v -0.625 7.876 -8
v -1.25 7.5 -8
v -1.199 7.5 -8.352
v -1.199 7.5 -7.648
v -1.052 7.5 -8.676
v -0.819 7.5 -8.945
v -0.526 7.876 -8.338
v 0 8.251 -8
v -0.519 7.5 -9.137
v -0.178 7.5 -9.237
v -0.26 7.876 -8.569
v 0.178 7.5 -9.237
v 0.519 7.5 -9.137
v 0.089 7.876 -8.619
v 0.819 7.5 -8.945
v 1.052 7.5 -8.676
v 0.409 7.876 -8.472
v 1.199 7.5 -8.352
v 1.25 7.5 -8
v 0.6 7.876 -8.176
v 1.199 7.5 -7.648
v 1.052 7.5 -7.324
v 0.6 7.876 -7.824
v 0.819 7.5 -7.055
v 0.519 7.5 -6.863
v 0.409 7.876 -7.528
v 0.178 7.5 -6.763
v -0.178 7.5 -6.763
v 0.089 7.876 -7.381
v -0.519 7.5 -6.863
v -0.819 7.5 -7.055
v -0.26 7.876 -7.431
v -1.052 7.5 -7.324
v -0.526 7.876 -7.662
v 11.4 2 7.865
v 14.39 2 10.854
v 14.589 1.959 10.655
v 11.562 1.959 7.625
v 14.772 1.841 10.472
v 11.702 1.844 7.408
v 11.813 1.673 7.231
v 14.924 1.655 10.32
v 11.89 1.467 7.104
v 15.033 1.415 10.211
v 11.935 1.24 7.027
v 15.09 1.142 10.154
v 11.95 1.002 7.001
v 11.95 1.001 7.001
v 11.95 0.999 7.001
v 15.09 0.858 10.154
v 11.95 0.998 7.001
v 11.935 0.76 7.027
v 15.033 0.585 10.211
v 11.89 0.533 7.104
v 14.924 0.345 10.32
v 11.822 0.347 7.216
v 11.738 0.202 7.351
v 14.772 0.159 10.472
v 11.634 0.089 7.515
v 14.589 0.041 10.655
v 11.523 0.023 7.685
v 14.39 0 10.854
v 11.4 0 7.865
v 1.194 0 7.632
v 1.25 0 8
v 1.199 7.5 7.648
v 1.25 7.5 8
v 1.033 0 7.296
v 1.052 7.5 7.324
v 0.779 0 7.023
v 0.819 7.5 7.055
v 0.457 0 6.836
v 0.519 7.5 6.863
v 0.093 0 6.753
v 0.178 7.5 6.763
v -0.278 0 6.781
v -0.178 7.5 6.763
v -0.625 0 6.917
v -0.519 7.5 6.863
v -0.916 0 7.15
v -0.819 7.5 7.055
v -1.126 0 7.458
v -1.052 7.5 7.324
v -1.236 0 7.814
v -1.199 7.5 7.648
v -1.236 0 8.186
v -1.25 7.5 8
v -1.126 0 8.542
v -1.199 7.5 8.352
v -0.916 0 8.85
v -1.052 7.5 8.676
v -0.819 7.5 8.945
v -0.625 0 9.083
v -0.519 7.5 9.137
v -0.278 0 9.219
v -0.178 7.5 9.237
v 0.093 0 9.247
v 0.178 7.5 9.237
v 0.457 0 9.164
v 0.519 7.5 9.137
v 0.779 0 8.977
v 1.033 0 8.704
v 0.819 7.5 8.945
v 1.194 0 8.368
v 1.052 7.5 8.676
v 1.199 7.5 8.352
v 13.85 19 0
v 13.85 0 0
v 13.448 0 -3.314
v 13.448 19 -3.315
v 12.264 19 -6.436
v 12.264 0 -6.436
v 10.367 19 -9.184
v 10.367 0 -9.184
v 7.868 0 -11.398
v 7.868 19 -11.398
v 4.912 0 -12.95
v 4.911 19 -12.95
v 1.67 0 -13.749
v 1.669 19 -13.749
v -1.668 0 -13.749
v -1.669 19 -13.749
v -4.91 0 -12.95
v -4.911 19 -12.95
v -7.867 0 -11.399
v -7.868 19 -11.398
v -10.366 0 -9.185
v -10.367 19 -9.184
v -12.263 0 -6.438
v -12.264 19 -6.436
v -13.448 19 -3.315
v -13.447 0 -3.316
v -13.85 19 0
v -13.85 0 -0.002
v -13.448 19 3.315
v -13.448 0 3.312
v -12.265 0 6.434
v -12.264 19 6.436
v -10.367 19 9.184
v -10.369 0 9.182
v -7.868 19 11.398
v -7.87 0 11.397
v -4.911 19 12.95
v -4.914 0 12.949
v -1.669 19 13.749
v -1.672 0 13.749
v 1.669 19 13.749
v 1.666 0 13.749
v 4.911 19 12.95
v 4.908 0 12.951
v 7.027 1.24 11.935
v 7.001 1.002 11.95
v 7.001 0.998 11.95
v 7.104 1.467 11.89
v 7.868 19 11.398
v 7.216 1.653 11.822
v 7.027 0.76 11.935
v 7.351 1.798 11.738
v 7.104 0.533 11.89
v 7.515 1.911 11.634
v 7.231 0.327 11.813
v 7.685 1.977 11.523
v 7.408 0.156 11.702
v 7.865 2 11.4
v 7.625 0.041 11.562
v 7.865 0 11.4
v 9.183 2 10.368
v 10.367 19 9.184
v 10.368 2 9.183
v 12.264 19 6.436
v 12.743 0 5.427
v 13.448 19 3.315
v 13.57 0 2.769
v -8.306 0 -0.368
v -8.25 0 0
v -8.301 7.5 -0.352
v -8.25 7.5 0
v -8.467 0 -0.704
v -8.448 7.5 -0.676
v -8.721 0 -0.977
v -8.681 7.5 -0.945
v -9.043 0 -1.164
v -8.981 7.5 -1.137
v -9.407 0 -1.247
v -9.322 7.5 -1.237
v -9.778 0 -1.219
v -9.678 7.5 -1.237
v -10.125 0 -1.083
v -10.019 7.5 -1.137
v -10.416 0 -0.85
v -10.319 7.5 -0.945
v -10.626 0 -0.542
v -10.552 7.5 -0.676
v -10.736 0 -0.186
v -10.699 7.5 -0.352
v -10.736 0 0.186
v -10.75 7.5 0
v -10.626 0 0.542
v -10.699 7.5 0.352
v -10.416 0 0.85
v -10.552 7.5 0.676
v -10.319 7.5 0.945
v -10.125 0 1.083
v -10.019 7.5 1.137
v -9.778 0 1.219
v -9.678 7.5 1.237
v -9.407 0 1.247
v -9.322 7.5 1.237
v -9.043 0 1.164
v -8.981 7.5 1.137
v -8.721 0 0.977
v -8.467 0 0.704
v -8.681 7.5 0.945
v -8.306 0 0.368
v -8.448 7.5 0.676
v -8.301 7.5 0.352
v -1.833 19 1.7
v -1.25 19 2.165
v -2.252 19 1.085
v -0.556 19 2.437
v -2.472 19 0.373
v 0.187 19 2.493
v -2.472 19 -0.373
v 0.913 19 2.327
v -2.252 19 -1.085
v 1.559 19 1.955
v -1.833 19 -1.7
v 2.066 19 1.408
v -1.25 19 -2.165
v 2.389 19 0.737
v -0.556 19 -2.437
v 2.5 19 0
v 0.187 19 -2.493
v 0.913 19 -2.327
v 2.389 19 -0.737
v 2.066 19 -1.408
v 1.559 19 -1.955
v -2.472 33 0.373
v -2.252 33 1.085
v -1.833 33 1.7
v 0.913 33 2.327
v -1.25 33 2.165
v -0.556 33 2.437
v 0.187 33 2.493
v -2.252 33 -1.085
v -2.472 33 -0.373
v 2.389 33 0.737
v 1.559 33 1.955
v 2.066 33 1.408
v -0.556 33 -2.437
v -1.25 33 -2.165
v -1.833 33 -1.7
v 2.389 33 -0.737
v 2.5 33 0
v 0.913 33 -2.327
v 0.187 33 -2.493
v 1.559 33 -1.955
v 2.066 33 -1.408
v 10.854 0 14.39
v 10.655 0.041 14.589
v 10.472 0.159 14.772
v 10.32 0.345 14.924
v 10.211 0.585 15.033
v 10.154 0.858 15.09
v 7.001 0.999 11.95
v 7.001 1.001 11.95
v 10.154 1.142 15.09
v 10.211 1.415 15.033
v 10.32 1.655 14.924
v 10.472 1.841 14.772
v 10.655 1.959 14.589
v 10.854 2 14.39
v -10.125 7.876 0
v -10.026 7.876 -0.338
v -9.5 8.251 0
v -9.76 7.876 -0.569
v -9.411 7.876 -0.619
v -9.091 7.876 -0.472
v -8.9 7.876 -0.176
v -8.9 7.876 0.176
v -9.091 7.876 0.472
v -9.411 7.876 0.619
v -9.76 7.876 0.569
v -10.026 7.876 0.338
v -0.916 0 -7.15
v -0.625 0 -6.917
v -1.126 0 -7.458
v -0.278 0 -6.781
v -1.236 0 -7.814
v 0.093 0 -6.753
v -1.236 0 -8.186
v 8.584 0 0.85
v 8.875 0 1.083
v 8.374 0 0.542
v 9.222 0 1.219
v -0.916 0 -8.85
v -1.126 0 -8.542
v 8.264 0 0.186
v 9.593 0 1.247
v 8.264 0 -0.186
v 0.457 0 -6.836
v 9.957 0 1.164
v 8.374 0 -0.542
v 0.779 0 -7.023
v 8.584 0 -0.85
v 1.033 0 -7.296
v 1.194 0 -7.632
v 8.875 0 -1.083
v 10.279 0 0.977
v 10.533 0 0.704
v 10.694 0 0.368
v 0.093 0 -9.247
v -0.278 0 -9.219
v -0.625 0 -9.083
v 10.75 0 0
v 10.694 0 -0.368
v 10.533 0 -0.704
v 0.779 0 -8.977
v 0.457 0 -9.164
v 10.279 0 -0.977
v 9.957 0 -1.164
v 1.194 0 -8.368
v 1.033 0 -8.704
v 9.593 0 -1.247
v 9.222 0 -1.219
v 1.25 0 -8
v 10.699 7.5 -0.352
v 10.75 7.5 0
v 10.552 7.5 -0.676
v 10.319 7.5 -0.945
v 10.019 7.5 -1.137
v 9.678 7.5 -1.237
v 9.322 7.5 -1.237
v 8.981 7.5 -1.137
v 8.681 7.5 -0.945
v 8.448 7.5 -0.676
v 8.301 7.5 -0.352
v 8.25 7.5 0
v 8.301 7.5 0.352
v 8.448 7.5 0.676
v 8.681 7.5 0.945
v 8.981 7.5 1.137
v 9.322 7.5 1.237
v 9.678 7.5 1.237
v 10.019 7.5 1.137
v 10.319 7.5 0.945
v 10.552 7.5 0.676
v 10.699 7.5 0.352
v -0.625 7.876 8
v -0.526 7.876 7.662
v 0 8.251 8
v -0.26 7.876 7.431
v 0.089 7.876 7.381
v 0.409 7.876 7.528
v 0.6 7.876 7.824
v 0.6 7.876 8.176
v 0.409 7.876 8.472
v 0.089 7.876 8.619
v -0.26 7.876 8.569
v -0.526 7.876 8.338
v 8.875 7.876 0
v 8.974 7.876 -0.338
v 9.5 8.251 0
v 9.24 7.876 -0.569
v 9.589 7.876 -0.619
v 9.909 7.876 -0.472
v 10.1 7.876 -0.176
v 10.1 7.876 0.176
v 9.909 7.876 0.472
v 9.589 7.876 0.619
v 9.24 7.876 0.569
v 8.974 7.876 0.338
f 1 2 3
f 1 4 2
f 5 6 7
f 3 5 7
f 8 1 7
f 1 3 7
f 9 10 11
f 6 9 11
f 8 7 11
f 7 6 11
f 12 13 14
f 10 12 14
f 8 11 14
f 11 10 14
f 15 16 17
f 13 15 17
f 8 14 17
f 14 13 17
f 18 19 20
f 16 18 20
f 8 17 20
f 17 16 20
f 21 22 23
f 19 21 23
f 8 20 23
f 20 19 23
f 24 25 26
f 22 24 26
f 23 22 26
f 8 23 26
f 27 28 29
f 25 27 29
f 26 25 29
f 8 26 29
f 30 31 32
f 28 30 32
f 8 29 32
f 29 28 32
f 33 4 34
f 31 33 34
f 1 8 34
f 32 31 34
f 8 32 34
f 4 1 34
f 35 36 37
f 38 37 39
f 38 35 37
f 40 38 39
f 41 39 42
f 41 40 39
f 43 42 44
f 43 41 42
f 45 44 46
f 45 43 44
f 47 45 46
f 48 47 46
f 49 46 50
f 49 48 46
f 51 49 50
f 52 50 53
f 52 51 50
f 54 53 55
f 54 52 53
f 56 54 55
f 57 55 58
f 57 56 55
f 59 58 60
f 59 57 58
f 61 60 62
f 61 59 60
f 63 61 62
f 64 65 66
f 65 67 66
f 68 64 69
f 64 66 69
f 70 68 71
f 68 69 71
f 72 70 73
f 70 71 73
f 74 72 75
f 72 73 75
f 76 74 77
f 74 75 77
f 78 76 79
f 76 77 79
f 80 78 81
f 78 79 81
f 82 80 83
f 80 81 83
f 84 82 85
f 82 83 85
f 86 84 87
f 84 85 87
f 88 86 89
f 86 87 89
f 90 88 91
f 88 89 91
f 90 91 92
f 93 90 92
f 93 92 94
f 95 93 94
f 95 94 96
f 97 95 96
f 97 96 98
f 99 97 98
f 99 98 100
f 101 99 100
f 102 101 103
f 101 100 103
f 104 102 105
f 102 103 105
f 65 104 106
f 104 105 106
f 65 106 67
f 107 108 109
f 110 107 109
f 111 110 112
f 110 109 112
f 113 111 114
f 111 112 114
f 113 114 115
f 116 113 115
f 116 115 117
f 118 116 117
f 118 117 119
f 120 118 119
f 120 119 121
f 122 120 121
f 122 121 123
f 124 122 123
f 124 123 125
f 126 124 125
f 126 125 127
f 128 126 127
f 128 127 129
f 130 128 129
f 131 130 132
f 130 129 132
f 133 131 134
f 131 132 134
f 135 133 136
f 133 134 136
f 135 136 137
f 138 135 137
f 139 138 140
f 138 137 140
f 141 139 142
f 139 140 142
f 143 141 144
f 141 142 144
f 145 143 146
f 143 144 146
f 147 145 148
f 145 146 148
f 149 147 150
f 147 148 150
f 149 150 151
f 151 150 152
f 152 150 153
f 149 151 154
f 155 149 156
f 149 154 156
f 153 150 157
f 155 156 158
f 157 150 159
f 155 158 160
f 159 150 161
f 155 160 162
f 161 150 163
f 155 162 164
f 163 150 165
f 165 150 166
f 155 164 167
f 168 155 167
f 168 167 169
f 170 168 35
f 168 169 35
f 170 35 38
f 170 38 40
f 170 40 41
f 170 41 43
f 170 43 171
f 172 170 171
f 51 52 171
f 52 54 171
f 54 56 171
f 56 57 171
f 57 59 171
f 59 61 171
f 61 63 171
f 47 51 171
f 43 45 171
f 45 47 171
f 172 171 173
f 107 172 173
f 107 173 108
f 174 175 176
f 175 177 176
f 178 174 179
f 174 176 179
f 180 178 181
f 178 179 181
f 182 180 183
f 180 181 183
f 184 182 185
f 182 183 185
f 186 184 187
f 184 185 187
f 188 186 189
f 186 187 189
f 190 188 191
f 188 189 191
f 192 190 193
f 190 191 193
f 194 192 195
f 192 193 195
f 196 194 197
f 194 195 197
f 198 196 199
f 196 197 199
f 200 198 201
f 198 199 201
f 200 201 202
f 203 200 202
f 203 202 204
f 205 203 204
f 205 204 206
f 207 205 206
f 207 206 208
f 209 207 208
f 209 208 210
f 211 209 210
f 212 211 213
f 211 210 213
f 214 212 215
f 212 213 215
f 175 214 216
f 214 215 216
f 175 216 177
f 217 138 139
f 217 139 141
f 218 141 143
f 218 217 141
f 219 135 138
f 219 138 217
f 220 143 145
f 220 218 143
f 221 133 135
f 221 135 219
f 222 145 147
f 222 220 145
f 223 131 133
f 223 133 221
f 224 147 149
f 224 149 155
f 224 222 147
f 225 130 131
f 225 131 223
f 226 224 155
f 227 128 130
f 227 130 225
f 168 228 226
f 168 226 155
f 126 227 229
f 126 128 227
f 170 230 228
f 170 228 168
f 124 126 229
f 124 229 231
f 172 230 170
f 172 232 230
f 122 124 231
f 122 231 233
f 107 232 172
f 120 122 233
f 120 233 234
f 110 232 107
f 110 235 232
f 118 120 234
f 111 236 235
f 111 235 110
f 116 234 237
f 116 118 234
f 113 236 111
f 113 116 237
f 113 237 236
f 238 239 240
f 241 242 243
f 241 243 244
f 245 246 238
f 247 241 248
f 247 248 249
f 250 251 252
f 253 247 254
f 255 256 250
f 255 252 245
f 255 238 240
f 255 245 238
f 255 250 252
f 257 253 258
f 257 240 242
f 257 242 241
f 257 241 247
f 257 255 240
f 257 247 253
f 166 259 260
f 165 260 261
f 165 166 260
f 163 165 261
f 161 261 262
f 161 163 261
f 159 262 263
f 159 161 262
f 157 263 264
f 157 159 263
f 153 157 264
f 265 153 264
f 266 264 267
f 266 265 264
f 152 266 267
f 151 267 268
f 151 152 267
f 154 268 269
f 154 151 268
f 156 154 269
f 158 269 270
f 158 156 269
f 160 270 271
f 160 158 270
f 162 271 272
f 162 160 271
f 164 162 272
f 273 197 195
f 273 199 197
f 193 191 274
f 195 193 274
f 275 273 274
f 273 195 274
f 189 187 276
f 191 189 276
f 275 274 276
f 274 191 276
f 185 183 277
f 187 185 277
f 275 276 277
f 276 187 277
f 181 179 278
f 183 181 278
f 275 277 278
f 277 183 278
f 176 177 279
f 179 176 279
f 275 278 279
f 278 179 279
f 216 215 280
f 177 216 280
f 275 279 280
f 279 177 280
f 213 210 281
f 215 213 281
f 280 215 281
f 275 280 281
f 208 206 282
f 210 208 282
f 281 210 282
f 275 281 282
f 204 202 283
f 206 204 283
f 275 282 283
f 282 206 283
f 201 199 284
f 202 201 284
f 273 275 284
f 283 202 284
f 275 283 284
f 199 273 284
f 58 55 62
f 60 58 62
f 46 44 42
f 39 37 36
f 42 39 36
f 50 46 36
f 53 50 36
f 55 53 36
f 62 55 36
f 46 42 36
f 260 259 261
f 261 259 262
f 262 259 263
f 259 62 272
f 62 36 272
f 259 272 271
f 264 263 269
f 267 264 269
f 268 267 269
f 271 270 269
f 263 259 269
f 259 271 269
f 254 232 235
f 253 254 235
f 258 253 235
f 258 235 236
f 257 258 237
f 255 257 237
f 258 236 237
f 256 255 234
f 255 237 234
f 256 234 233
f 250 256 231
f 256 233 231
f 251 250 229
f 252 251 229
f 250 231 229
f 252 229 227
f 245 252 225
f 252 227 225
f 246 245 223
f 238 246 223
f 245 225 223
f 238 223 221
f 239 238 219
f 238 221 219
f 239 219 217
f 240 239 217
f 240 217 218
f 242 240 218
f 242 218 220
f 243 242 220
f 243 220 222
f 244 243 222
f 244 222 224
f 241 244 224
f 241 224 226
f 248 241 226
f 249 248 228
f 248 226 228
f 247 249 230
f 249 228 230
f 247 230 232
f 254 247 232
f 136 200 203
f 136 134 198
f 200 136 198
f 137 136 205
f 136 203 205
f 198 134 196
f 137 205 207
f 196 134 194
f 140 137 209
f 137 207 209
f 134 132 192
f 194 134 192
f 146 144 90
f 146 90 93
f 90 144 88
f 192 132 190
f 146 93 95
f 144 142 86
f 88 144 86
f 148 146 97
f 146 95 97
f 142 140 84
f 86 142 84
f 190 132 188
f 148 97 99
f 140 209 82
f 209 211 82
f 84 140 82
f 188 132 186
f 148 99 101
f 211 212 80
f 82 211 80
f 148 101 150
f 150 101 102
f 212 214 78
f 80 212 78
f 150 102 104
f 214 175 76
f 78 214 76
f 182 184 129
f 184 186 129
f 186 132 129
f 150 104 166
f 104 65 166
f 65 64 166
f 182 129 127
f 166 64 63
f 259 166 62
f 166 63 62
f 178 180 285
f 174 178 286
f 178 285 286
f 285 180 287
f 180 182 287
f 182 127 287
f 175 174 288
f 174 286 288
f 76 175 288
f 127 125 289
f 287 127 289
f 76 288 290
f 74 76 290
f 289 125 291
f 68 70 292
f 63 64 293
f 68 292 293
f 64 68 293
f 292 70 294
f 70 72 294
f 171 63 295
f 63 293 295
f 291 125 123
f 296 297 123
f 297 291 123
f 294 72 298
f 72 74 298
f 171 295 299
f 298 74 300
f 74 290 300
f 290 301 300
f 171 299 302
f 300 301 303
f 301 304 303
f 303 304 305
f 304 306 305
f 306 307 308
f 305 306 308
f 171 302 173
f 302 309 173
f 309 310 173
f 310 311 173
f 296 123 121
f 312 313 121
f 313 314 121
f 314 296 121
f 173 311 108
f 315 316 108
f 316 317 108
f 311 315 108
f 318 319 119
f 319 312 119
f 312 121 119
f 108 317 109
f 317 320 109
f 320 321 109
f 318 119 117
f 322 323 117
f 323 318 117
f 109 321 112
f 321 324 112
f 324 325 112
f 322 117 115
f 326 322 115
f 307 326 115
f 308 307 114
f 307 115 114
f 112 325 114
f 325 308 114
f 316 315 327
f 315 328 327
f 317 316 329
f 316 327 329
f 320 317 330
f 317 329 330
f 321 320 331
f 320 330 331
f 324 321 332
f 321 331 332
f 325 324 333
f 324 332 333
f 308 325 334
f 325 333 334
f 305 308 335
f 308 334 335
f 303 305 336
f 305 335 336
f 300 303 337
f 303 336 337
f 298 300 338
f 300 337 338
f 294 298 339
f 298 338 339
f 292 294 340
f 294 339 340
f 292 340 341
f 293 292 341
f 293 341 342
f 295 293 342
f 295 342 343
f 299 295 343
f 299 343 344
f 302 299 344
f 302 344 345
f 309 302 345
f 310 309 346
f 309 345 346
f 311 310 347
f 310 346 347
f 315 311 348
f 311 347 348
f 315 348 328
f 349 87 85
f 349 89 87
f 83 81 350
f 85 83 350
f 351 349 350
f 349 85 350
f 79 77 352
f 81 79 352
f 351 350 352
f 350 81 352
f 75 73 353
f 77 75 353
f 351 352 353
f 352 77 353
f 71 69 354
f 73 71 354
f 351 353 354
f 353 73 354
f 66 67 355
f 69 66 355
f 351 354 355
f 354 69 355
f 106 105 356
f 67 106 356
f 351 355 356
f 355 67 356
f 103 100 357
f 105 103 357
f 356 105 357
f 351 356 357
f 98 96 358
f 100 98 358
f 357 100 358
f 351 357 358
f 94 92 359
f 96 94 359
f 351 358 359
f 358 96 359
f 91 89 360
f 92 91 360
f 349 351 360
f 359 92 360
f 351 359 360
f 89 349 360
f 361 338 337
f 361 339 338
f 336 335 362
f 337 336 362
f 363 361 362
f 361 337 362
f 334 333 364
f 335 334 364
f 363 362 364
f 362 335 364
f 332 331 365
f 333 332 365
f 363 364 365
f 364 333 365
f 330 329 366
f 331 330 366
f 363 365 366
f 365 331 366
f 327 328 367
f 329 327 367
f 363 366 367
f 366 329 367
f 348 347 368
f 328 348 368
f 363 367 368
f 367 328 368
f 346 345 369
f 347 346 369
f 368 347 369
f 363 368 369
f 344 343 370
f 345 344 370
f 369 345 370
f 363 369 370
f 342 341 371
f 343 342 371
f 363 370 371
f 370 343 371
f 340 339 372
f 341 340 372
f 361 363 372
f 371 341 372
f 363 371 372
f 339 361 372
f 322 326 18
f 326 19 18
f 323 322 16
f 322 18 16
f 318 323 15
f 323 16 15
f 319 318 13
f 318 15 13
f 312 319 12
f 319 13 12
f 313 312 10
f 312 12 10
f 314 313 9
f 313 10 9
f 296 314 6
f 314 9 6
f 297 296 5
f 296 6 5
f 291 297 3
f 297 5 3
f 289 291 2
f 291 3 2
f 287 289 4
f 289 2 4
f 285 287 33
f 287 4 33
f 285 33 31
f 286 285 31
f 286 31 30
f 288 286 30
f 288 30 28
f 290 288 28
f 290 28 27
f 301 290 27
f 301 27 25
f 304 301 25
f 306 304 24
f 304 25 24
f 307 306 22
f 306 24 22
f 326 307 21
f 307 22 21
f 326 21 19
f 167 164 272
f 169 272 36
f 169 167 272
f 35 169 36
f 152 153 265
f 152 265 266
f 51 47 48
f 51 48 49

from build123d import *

# Parameters (mm, degrees)
SKETCH1_R                 = 13.85
BOSS_EXTRUDE1_DEPTH       = 19
SKETCH2_R                 = 2.5
BOSS_EXTRUDE2_DEPTH       = 14
M3X0_5_TAPPED_HOLE1_D     = 2.5
M3X0_5_TAPPED_HOLE1_DEPTH = 7.5
M3X0_5_TAPPED_HOLE1_TIP   = 0.751075774
BOSS_EXTRUDE3_START       = -0.449533
BOSS_EXTRUDE3_DEPTH       = 4.449533


with BuildPart() as part:
    # Sketch1 → Boss-Extrude1 (new body)
    with BuildSketch(Plane(origin=(0, 0, 0), x_dir=(1, 0, 0), z_dir=(0, 1, 0))):
        Circle(SKETCH1_R)
    extrude(amount=BOSS_EXTRUDE1_DEPTH)

    # Sketch2 → Boss-Extrude2 (add)
    with BuildSketch(Plane(origin=(0, 19, 0), x_dir=(1, 0, 0), z_dir=(0, 1, 0))):
        Circle(SKETCH2_R)
    extrude(amount=BOSS_EXTRUDE2_DEPTH)

    # M3x0.5 Tapped Hole1
    with Locations(Plane(origin=(0, 0, 0), x_dir=(-1, 0, 0), z_dir=(0, -1, 0))):
        with Locations((0, -8), (9.5, 0), (0, 8), (-9.5, 0)):
            Hole(M3X0_5_TAPPED_HOLE1_D / 2, depth=M3X0_5_TAPPED_HOLE1_DEPTH)
            with Locations((0, 0, -(M3X0_5_TAPPED_HOLE1_DEPTH + M3X0_5_TAPPED_HOLE1_TIP / 2))):  # 118° drill point
                Cone(0, M3X0_5_TAPPED_HOLE1_D / 2, M3X0_5_TAPPED_HOLE1_TIP, mode=Mode.SUBTRACT)

    # Sketch7 → Boss-Extrude3 (add)
    with BuildSketch(Plane(origin=(9.793428919, 0, 9.793428919), x_dir=(0.707106781, 0, -0.707106781), z_dir=(0.707106781, 0, 0.707106781)).offset(BOSS_EXTRUDE3_START)):
        with BuildLine():
            Line((-2.5, 2), (2.5, 2))
            ThreePointArc((2.5, 2), (3.5, 1), (2.5, 0))
            Line((2.5, 0), (-2.5, 0))
            ThreePointArc((-2.5, 0), (-3.5, 1), (-2.5, 2))
        make_face()
    extrude(amount=BOSS_EXTRUDE3_DEPTH)


solid = part.part
